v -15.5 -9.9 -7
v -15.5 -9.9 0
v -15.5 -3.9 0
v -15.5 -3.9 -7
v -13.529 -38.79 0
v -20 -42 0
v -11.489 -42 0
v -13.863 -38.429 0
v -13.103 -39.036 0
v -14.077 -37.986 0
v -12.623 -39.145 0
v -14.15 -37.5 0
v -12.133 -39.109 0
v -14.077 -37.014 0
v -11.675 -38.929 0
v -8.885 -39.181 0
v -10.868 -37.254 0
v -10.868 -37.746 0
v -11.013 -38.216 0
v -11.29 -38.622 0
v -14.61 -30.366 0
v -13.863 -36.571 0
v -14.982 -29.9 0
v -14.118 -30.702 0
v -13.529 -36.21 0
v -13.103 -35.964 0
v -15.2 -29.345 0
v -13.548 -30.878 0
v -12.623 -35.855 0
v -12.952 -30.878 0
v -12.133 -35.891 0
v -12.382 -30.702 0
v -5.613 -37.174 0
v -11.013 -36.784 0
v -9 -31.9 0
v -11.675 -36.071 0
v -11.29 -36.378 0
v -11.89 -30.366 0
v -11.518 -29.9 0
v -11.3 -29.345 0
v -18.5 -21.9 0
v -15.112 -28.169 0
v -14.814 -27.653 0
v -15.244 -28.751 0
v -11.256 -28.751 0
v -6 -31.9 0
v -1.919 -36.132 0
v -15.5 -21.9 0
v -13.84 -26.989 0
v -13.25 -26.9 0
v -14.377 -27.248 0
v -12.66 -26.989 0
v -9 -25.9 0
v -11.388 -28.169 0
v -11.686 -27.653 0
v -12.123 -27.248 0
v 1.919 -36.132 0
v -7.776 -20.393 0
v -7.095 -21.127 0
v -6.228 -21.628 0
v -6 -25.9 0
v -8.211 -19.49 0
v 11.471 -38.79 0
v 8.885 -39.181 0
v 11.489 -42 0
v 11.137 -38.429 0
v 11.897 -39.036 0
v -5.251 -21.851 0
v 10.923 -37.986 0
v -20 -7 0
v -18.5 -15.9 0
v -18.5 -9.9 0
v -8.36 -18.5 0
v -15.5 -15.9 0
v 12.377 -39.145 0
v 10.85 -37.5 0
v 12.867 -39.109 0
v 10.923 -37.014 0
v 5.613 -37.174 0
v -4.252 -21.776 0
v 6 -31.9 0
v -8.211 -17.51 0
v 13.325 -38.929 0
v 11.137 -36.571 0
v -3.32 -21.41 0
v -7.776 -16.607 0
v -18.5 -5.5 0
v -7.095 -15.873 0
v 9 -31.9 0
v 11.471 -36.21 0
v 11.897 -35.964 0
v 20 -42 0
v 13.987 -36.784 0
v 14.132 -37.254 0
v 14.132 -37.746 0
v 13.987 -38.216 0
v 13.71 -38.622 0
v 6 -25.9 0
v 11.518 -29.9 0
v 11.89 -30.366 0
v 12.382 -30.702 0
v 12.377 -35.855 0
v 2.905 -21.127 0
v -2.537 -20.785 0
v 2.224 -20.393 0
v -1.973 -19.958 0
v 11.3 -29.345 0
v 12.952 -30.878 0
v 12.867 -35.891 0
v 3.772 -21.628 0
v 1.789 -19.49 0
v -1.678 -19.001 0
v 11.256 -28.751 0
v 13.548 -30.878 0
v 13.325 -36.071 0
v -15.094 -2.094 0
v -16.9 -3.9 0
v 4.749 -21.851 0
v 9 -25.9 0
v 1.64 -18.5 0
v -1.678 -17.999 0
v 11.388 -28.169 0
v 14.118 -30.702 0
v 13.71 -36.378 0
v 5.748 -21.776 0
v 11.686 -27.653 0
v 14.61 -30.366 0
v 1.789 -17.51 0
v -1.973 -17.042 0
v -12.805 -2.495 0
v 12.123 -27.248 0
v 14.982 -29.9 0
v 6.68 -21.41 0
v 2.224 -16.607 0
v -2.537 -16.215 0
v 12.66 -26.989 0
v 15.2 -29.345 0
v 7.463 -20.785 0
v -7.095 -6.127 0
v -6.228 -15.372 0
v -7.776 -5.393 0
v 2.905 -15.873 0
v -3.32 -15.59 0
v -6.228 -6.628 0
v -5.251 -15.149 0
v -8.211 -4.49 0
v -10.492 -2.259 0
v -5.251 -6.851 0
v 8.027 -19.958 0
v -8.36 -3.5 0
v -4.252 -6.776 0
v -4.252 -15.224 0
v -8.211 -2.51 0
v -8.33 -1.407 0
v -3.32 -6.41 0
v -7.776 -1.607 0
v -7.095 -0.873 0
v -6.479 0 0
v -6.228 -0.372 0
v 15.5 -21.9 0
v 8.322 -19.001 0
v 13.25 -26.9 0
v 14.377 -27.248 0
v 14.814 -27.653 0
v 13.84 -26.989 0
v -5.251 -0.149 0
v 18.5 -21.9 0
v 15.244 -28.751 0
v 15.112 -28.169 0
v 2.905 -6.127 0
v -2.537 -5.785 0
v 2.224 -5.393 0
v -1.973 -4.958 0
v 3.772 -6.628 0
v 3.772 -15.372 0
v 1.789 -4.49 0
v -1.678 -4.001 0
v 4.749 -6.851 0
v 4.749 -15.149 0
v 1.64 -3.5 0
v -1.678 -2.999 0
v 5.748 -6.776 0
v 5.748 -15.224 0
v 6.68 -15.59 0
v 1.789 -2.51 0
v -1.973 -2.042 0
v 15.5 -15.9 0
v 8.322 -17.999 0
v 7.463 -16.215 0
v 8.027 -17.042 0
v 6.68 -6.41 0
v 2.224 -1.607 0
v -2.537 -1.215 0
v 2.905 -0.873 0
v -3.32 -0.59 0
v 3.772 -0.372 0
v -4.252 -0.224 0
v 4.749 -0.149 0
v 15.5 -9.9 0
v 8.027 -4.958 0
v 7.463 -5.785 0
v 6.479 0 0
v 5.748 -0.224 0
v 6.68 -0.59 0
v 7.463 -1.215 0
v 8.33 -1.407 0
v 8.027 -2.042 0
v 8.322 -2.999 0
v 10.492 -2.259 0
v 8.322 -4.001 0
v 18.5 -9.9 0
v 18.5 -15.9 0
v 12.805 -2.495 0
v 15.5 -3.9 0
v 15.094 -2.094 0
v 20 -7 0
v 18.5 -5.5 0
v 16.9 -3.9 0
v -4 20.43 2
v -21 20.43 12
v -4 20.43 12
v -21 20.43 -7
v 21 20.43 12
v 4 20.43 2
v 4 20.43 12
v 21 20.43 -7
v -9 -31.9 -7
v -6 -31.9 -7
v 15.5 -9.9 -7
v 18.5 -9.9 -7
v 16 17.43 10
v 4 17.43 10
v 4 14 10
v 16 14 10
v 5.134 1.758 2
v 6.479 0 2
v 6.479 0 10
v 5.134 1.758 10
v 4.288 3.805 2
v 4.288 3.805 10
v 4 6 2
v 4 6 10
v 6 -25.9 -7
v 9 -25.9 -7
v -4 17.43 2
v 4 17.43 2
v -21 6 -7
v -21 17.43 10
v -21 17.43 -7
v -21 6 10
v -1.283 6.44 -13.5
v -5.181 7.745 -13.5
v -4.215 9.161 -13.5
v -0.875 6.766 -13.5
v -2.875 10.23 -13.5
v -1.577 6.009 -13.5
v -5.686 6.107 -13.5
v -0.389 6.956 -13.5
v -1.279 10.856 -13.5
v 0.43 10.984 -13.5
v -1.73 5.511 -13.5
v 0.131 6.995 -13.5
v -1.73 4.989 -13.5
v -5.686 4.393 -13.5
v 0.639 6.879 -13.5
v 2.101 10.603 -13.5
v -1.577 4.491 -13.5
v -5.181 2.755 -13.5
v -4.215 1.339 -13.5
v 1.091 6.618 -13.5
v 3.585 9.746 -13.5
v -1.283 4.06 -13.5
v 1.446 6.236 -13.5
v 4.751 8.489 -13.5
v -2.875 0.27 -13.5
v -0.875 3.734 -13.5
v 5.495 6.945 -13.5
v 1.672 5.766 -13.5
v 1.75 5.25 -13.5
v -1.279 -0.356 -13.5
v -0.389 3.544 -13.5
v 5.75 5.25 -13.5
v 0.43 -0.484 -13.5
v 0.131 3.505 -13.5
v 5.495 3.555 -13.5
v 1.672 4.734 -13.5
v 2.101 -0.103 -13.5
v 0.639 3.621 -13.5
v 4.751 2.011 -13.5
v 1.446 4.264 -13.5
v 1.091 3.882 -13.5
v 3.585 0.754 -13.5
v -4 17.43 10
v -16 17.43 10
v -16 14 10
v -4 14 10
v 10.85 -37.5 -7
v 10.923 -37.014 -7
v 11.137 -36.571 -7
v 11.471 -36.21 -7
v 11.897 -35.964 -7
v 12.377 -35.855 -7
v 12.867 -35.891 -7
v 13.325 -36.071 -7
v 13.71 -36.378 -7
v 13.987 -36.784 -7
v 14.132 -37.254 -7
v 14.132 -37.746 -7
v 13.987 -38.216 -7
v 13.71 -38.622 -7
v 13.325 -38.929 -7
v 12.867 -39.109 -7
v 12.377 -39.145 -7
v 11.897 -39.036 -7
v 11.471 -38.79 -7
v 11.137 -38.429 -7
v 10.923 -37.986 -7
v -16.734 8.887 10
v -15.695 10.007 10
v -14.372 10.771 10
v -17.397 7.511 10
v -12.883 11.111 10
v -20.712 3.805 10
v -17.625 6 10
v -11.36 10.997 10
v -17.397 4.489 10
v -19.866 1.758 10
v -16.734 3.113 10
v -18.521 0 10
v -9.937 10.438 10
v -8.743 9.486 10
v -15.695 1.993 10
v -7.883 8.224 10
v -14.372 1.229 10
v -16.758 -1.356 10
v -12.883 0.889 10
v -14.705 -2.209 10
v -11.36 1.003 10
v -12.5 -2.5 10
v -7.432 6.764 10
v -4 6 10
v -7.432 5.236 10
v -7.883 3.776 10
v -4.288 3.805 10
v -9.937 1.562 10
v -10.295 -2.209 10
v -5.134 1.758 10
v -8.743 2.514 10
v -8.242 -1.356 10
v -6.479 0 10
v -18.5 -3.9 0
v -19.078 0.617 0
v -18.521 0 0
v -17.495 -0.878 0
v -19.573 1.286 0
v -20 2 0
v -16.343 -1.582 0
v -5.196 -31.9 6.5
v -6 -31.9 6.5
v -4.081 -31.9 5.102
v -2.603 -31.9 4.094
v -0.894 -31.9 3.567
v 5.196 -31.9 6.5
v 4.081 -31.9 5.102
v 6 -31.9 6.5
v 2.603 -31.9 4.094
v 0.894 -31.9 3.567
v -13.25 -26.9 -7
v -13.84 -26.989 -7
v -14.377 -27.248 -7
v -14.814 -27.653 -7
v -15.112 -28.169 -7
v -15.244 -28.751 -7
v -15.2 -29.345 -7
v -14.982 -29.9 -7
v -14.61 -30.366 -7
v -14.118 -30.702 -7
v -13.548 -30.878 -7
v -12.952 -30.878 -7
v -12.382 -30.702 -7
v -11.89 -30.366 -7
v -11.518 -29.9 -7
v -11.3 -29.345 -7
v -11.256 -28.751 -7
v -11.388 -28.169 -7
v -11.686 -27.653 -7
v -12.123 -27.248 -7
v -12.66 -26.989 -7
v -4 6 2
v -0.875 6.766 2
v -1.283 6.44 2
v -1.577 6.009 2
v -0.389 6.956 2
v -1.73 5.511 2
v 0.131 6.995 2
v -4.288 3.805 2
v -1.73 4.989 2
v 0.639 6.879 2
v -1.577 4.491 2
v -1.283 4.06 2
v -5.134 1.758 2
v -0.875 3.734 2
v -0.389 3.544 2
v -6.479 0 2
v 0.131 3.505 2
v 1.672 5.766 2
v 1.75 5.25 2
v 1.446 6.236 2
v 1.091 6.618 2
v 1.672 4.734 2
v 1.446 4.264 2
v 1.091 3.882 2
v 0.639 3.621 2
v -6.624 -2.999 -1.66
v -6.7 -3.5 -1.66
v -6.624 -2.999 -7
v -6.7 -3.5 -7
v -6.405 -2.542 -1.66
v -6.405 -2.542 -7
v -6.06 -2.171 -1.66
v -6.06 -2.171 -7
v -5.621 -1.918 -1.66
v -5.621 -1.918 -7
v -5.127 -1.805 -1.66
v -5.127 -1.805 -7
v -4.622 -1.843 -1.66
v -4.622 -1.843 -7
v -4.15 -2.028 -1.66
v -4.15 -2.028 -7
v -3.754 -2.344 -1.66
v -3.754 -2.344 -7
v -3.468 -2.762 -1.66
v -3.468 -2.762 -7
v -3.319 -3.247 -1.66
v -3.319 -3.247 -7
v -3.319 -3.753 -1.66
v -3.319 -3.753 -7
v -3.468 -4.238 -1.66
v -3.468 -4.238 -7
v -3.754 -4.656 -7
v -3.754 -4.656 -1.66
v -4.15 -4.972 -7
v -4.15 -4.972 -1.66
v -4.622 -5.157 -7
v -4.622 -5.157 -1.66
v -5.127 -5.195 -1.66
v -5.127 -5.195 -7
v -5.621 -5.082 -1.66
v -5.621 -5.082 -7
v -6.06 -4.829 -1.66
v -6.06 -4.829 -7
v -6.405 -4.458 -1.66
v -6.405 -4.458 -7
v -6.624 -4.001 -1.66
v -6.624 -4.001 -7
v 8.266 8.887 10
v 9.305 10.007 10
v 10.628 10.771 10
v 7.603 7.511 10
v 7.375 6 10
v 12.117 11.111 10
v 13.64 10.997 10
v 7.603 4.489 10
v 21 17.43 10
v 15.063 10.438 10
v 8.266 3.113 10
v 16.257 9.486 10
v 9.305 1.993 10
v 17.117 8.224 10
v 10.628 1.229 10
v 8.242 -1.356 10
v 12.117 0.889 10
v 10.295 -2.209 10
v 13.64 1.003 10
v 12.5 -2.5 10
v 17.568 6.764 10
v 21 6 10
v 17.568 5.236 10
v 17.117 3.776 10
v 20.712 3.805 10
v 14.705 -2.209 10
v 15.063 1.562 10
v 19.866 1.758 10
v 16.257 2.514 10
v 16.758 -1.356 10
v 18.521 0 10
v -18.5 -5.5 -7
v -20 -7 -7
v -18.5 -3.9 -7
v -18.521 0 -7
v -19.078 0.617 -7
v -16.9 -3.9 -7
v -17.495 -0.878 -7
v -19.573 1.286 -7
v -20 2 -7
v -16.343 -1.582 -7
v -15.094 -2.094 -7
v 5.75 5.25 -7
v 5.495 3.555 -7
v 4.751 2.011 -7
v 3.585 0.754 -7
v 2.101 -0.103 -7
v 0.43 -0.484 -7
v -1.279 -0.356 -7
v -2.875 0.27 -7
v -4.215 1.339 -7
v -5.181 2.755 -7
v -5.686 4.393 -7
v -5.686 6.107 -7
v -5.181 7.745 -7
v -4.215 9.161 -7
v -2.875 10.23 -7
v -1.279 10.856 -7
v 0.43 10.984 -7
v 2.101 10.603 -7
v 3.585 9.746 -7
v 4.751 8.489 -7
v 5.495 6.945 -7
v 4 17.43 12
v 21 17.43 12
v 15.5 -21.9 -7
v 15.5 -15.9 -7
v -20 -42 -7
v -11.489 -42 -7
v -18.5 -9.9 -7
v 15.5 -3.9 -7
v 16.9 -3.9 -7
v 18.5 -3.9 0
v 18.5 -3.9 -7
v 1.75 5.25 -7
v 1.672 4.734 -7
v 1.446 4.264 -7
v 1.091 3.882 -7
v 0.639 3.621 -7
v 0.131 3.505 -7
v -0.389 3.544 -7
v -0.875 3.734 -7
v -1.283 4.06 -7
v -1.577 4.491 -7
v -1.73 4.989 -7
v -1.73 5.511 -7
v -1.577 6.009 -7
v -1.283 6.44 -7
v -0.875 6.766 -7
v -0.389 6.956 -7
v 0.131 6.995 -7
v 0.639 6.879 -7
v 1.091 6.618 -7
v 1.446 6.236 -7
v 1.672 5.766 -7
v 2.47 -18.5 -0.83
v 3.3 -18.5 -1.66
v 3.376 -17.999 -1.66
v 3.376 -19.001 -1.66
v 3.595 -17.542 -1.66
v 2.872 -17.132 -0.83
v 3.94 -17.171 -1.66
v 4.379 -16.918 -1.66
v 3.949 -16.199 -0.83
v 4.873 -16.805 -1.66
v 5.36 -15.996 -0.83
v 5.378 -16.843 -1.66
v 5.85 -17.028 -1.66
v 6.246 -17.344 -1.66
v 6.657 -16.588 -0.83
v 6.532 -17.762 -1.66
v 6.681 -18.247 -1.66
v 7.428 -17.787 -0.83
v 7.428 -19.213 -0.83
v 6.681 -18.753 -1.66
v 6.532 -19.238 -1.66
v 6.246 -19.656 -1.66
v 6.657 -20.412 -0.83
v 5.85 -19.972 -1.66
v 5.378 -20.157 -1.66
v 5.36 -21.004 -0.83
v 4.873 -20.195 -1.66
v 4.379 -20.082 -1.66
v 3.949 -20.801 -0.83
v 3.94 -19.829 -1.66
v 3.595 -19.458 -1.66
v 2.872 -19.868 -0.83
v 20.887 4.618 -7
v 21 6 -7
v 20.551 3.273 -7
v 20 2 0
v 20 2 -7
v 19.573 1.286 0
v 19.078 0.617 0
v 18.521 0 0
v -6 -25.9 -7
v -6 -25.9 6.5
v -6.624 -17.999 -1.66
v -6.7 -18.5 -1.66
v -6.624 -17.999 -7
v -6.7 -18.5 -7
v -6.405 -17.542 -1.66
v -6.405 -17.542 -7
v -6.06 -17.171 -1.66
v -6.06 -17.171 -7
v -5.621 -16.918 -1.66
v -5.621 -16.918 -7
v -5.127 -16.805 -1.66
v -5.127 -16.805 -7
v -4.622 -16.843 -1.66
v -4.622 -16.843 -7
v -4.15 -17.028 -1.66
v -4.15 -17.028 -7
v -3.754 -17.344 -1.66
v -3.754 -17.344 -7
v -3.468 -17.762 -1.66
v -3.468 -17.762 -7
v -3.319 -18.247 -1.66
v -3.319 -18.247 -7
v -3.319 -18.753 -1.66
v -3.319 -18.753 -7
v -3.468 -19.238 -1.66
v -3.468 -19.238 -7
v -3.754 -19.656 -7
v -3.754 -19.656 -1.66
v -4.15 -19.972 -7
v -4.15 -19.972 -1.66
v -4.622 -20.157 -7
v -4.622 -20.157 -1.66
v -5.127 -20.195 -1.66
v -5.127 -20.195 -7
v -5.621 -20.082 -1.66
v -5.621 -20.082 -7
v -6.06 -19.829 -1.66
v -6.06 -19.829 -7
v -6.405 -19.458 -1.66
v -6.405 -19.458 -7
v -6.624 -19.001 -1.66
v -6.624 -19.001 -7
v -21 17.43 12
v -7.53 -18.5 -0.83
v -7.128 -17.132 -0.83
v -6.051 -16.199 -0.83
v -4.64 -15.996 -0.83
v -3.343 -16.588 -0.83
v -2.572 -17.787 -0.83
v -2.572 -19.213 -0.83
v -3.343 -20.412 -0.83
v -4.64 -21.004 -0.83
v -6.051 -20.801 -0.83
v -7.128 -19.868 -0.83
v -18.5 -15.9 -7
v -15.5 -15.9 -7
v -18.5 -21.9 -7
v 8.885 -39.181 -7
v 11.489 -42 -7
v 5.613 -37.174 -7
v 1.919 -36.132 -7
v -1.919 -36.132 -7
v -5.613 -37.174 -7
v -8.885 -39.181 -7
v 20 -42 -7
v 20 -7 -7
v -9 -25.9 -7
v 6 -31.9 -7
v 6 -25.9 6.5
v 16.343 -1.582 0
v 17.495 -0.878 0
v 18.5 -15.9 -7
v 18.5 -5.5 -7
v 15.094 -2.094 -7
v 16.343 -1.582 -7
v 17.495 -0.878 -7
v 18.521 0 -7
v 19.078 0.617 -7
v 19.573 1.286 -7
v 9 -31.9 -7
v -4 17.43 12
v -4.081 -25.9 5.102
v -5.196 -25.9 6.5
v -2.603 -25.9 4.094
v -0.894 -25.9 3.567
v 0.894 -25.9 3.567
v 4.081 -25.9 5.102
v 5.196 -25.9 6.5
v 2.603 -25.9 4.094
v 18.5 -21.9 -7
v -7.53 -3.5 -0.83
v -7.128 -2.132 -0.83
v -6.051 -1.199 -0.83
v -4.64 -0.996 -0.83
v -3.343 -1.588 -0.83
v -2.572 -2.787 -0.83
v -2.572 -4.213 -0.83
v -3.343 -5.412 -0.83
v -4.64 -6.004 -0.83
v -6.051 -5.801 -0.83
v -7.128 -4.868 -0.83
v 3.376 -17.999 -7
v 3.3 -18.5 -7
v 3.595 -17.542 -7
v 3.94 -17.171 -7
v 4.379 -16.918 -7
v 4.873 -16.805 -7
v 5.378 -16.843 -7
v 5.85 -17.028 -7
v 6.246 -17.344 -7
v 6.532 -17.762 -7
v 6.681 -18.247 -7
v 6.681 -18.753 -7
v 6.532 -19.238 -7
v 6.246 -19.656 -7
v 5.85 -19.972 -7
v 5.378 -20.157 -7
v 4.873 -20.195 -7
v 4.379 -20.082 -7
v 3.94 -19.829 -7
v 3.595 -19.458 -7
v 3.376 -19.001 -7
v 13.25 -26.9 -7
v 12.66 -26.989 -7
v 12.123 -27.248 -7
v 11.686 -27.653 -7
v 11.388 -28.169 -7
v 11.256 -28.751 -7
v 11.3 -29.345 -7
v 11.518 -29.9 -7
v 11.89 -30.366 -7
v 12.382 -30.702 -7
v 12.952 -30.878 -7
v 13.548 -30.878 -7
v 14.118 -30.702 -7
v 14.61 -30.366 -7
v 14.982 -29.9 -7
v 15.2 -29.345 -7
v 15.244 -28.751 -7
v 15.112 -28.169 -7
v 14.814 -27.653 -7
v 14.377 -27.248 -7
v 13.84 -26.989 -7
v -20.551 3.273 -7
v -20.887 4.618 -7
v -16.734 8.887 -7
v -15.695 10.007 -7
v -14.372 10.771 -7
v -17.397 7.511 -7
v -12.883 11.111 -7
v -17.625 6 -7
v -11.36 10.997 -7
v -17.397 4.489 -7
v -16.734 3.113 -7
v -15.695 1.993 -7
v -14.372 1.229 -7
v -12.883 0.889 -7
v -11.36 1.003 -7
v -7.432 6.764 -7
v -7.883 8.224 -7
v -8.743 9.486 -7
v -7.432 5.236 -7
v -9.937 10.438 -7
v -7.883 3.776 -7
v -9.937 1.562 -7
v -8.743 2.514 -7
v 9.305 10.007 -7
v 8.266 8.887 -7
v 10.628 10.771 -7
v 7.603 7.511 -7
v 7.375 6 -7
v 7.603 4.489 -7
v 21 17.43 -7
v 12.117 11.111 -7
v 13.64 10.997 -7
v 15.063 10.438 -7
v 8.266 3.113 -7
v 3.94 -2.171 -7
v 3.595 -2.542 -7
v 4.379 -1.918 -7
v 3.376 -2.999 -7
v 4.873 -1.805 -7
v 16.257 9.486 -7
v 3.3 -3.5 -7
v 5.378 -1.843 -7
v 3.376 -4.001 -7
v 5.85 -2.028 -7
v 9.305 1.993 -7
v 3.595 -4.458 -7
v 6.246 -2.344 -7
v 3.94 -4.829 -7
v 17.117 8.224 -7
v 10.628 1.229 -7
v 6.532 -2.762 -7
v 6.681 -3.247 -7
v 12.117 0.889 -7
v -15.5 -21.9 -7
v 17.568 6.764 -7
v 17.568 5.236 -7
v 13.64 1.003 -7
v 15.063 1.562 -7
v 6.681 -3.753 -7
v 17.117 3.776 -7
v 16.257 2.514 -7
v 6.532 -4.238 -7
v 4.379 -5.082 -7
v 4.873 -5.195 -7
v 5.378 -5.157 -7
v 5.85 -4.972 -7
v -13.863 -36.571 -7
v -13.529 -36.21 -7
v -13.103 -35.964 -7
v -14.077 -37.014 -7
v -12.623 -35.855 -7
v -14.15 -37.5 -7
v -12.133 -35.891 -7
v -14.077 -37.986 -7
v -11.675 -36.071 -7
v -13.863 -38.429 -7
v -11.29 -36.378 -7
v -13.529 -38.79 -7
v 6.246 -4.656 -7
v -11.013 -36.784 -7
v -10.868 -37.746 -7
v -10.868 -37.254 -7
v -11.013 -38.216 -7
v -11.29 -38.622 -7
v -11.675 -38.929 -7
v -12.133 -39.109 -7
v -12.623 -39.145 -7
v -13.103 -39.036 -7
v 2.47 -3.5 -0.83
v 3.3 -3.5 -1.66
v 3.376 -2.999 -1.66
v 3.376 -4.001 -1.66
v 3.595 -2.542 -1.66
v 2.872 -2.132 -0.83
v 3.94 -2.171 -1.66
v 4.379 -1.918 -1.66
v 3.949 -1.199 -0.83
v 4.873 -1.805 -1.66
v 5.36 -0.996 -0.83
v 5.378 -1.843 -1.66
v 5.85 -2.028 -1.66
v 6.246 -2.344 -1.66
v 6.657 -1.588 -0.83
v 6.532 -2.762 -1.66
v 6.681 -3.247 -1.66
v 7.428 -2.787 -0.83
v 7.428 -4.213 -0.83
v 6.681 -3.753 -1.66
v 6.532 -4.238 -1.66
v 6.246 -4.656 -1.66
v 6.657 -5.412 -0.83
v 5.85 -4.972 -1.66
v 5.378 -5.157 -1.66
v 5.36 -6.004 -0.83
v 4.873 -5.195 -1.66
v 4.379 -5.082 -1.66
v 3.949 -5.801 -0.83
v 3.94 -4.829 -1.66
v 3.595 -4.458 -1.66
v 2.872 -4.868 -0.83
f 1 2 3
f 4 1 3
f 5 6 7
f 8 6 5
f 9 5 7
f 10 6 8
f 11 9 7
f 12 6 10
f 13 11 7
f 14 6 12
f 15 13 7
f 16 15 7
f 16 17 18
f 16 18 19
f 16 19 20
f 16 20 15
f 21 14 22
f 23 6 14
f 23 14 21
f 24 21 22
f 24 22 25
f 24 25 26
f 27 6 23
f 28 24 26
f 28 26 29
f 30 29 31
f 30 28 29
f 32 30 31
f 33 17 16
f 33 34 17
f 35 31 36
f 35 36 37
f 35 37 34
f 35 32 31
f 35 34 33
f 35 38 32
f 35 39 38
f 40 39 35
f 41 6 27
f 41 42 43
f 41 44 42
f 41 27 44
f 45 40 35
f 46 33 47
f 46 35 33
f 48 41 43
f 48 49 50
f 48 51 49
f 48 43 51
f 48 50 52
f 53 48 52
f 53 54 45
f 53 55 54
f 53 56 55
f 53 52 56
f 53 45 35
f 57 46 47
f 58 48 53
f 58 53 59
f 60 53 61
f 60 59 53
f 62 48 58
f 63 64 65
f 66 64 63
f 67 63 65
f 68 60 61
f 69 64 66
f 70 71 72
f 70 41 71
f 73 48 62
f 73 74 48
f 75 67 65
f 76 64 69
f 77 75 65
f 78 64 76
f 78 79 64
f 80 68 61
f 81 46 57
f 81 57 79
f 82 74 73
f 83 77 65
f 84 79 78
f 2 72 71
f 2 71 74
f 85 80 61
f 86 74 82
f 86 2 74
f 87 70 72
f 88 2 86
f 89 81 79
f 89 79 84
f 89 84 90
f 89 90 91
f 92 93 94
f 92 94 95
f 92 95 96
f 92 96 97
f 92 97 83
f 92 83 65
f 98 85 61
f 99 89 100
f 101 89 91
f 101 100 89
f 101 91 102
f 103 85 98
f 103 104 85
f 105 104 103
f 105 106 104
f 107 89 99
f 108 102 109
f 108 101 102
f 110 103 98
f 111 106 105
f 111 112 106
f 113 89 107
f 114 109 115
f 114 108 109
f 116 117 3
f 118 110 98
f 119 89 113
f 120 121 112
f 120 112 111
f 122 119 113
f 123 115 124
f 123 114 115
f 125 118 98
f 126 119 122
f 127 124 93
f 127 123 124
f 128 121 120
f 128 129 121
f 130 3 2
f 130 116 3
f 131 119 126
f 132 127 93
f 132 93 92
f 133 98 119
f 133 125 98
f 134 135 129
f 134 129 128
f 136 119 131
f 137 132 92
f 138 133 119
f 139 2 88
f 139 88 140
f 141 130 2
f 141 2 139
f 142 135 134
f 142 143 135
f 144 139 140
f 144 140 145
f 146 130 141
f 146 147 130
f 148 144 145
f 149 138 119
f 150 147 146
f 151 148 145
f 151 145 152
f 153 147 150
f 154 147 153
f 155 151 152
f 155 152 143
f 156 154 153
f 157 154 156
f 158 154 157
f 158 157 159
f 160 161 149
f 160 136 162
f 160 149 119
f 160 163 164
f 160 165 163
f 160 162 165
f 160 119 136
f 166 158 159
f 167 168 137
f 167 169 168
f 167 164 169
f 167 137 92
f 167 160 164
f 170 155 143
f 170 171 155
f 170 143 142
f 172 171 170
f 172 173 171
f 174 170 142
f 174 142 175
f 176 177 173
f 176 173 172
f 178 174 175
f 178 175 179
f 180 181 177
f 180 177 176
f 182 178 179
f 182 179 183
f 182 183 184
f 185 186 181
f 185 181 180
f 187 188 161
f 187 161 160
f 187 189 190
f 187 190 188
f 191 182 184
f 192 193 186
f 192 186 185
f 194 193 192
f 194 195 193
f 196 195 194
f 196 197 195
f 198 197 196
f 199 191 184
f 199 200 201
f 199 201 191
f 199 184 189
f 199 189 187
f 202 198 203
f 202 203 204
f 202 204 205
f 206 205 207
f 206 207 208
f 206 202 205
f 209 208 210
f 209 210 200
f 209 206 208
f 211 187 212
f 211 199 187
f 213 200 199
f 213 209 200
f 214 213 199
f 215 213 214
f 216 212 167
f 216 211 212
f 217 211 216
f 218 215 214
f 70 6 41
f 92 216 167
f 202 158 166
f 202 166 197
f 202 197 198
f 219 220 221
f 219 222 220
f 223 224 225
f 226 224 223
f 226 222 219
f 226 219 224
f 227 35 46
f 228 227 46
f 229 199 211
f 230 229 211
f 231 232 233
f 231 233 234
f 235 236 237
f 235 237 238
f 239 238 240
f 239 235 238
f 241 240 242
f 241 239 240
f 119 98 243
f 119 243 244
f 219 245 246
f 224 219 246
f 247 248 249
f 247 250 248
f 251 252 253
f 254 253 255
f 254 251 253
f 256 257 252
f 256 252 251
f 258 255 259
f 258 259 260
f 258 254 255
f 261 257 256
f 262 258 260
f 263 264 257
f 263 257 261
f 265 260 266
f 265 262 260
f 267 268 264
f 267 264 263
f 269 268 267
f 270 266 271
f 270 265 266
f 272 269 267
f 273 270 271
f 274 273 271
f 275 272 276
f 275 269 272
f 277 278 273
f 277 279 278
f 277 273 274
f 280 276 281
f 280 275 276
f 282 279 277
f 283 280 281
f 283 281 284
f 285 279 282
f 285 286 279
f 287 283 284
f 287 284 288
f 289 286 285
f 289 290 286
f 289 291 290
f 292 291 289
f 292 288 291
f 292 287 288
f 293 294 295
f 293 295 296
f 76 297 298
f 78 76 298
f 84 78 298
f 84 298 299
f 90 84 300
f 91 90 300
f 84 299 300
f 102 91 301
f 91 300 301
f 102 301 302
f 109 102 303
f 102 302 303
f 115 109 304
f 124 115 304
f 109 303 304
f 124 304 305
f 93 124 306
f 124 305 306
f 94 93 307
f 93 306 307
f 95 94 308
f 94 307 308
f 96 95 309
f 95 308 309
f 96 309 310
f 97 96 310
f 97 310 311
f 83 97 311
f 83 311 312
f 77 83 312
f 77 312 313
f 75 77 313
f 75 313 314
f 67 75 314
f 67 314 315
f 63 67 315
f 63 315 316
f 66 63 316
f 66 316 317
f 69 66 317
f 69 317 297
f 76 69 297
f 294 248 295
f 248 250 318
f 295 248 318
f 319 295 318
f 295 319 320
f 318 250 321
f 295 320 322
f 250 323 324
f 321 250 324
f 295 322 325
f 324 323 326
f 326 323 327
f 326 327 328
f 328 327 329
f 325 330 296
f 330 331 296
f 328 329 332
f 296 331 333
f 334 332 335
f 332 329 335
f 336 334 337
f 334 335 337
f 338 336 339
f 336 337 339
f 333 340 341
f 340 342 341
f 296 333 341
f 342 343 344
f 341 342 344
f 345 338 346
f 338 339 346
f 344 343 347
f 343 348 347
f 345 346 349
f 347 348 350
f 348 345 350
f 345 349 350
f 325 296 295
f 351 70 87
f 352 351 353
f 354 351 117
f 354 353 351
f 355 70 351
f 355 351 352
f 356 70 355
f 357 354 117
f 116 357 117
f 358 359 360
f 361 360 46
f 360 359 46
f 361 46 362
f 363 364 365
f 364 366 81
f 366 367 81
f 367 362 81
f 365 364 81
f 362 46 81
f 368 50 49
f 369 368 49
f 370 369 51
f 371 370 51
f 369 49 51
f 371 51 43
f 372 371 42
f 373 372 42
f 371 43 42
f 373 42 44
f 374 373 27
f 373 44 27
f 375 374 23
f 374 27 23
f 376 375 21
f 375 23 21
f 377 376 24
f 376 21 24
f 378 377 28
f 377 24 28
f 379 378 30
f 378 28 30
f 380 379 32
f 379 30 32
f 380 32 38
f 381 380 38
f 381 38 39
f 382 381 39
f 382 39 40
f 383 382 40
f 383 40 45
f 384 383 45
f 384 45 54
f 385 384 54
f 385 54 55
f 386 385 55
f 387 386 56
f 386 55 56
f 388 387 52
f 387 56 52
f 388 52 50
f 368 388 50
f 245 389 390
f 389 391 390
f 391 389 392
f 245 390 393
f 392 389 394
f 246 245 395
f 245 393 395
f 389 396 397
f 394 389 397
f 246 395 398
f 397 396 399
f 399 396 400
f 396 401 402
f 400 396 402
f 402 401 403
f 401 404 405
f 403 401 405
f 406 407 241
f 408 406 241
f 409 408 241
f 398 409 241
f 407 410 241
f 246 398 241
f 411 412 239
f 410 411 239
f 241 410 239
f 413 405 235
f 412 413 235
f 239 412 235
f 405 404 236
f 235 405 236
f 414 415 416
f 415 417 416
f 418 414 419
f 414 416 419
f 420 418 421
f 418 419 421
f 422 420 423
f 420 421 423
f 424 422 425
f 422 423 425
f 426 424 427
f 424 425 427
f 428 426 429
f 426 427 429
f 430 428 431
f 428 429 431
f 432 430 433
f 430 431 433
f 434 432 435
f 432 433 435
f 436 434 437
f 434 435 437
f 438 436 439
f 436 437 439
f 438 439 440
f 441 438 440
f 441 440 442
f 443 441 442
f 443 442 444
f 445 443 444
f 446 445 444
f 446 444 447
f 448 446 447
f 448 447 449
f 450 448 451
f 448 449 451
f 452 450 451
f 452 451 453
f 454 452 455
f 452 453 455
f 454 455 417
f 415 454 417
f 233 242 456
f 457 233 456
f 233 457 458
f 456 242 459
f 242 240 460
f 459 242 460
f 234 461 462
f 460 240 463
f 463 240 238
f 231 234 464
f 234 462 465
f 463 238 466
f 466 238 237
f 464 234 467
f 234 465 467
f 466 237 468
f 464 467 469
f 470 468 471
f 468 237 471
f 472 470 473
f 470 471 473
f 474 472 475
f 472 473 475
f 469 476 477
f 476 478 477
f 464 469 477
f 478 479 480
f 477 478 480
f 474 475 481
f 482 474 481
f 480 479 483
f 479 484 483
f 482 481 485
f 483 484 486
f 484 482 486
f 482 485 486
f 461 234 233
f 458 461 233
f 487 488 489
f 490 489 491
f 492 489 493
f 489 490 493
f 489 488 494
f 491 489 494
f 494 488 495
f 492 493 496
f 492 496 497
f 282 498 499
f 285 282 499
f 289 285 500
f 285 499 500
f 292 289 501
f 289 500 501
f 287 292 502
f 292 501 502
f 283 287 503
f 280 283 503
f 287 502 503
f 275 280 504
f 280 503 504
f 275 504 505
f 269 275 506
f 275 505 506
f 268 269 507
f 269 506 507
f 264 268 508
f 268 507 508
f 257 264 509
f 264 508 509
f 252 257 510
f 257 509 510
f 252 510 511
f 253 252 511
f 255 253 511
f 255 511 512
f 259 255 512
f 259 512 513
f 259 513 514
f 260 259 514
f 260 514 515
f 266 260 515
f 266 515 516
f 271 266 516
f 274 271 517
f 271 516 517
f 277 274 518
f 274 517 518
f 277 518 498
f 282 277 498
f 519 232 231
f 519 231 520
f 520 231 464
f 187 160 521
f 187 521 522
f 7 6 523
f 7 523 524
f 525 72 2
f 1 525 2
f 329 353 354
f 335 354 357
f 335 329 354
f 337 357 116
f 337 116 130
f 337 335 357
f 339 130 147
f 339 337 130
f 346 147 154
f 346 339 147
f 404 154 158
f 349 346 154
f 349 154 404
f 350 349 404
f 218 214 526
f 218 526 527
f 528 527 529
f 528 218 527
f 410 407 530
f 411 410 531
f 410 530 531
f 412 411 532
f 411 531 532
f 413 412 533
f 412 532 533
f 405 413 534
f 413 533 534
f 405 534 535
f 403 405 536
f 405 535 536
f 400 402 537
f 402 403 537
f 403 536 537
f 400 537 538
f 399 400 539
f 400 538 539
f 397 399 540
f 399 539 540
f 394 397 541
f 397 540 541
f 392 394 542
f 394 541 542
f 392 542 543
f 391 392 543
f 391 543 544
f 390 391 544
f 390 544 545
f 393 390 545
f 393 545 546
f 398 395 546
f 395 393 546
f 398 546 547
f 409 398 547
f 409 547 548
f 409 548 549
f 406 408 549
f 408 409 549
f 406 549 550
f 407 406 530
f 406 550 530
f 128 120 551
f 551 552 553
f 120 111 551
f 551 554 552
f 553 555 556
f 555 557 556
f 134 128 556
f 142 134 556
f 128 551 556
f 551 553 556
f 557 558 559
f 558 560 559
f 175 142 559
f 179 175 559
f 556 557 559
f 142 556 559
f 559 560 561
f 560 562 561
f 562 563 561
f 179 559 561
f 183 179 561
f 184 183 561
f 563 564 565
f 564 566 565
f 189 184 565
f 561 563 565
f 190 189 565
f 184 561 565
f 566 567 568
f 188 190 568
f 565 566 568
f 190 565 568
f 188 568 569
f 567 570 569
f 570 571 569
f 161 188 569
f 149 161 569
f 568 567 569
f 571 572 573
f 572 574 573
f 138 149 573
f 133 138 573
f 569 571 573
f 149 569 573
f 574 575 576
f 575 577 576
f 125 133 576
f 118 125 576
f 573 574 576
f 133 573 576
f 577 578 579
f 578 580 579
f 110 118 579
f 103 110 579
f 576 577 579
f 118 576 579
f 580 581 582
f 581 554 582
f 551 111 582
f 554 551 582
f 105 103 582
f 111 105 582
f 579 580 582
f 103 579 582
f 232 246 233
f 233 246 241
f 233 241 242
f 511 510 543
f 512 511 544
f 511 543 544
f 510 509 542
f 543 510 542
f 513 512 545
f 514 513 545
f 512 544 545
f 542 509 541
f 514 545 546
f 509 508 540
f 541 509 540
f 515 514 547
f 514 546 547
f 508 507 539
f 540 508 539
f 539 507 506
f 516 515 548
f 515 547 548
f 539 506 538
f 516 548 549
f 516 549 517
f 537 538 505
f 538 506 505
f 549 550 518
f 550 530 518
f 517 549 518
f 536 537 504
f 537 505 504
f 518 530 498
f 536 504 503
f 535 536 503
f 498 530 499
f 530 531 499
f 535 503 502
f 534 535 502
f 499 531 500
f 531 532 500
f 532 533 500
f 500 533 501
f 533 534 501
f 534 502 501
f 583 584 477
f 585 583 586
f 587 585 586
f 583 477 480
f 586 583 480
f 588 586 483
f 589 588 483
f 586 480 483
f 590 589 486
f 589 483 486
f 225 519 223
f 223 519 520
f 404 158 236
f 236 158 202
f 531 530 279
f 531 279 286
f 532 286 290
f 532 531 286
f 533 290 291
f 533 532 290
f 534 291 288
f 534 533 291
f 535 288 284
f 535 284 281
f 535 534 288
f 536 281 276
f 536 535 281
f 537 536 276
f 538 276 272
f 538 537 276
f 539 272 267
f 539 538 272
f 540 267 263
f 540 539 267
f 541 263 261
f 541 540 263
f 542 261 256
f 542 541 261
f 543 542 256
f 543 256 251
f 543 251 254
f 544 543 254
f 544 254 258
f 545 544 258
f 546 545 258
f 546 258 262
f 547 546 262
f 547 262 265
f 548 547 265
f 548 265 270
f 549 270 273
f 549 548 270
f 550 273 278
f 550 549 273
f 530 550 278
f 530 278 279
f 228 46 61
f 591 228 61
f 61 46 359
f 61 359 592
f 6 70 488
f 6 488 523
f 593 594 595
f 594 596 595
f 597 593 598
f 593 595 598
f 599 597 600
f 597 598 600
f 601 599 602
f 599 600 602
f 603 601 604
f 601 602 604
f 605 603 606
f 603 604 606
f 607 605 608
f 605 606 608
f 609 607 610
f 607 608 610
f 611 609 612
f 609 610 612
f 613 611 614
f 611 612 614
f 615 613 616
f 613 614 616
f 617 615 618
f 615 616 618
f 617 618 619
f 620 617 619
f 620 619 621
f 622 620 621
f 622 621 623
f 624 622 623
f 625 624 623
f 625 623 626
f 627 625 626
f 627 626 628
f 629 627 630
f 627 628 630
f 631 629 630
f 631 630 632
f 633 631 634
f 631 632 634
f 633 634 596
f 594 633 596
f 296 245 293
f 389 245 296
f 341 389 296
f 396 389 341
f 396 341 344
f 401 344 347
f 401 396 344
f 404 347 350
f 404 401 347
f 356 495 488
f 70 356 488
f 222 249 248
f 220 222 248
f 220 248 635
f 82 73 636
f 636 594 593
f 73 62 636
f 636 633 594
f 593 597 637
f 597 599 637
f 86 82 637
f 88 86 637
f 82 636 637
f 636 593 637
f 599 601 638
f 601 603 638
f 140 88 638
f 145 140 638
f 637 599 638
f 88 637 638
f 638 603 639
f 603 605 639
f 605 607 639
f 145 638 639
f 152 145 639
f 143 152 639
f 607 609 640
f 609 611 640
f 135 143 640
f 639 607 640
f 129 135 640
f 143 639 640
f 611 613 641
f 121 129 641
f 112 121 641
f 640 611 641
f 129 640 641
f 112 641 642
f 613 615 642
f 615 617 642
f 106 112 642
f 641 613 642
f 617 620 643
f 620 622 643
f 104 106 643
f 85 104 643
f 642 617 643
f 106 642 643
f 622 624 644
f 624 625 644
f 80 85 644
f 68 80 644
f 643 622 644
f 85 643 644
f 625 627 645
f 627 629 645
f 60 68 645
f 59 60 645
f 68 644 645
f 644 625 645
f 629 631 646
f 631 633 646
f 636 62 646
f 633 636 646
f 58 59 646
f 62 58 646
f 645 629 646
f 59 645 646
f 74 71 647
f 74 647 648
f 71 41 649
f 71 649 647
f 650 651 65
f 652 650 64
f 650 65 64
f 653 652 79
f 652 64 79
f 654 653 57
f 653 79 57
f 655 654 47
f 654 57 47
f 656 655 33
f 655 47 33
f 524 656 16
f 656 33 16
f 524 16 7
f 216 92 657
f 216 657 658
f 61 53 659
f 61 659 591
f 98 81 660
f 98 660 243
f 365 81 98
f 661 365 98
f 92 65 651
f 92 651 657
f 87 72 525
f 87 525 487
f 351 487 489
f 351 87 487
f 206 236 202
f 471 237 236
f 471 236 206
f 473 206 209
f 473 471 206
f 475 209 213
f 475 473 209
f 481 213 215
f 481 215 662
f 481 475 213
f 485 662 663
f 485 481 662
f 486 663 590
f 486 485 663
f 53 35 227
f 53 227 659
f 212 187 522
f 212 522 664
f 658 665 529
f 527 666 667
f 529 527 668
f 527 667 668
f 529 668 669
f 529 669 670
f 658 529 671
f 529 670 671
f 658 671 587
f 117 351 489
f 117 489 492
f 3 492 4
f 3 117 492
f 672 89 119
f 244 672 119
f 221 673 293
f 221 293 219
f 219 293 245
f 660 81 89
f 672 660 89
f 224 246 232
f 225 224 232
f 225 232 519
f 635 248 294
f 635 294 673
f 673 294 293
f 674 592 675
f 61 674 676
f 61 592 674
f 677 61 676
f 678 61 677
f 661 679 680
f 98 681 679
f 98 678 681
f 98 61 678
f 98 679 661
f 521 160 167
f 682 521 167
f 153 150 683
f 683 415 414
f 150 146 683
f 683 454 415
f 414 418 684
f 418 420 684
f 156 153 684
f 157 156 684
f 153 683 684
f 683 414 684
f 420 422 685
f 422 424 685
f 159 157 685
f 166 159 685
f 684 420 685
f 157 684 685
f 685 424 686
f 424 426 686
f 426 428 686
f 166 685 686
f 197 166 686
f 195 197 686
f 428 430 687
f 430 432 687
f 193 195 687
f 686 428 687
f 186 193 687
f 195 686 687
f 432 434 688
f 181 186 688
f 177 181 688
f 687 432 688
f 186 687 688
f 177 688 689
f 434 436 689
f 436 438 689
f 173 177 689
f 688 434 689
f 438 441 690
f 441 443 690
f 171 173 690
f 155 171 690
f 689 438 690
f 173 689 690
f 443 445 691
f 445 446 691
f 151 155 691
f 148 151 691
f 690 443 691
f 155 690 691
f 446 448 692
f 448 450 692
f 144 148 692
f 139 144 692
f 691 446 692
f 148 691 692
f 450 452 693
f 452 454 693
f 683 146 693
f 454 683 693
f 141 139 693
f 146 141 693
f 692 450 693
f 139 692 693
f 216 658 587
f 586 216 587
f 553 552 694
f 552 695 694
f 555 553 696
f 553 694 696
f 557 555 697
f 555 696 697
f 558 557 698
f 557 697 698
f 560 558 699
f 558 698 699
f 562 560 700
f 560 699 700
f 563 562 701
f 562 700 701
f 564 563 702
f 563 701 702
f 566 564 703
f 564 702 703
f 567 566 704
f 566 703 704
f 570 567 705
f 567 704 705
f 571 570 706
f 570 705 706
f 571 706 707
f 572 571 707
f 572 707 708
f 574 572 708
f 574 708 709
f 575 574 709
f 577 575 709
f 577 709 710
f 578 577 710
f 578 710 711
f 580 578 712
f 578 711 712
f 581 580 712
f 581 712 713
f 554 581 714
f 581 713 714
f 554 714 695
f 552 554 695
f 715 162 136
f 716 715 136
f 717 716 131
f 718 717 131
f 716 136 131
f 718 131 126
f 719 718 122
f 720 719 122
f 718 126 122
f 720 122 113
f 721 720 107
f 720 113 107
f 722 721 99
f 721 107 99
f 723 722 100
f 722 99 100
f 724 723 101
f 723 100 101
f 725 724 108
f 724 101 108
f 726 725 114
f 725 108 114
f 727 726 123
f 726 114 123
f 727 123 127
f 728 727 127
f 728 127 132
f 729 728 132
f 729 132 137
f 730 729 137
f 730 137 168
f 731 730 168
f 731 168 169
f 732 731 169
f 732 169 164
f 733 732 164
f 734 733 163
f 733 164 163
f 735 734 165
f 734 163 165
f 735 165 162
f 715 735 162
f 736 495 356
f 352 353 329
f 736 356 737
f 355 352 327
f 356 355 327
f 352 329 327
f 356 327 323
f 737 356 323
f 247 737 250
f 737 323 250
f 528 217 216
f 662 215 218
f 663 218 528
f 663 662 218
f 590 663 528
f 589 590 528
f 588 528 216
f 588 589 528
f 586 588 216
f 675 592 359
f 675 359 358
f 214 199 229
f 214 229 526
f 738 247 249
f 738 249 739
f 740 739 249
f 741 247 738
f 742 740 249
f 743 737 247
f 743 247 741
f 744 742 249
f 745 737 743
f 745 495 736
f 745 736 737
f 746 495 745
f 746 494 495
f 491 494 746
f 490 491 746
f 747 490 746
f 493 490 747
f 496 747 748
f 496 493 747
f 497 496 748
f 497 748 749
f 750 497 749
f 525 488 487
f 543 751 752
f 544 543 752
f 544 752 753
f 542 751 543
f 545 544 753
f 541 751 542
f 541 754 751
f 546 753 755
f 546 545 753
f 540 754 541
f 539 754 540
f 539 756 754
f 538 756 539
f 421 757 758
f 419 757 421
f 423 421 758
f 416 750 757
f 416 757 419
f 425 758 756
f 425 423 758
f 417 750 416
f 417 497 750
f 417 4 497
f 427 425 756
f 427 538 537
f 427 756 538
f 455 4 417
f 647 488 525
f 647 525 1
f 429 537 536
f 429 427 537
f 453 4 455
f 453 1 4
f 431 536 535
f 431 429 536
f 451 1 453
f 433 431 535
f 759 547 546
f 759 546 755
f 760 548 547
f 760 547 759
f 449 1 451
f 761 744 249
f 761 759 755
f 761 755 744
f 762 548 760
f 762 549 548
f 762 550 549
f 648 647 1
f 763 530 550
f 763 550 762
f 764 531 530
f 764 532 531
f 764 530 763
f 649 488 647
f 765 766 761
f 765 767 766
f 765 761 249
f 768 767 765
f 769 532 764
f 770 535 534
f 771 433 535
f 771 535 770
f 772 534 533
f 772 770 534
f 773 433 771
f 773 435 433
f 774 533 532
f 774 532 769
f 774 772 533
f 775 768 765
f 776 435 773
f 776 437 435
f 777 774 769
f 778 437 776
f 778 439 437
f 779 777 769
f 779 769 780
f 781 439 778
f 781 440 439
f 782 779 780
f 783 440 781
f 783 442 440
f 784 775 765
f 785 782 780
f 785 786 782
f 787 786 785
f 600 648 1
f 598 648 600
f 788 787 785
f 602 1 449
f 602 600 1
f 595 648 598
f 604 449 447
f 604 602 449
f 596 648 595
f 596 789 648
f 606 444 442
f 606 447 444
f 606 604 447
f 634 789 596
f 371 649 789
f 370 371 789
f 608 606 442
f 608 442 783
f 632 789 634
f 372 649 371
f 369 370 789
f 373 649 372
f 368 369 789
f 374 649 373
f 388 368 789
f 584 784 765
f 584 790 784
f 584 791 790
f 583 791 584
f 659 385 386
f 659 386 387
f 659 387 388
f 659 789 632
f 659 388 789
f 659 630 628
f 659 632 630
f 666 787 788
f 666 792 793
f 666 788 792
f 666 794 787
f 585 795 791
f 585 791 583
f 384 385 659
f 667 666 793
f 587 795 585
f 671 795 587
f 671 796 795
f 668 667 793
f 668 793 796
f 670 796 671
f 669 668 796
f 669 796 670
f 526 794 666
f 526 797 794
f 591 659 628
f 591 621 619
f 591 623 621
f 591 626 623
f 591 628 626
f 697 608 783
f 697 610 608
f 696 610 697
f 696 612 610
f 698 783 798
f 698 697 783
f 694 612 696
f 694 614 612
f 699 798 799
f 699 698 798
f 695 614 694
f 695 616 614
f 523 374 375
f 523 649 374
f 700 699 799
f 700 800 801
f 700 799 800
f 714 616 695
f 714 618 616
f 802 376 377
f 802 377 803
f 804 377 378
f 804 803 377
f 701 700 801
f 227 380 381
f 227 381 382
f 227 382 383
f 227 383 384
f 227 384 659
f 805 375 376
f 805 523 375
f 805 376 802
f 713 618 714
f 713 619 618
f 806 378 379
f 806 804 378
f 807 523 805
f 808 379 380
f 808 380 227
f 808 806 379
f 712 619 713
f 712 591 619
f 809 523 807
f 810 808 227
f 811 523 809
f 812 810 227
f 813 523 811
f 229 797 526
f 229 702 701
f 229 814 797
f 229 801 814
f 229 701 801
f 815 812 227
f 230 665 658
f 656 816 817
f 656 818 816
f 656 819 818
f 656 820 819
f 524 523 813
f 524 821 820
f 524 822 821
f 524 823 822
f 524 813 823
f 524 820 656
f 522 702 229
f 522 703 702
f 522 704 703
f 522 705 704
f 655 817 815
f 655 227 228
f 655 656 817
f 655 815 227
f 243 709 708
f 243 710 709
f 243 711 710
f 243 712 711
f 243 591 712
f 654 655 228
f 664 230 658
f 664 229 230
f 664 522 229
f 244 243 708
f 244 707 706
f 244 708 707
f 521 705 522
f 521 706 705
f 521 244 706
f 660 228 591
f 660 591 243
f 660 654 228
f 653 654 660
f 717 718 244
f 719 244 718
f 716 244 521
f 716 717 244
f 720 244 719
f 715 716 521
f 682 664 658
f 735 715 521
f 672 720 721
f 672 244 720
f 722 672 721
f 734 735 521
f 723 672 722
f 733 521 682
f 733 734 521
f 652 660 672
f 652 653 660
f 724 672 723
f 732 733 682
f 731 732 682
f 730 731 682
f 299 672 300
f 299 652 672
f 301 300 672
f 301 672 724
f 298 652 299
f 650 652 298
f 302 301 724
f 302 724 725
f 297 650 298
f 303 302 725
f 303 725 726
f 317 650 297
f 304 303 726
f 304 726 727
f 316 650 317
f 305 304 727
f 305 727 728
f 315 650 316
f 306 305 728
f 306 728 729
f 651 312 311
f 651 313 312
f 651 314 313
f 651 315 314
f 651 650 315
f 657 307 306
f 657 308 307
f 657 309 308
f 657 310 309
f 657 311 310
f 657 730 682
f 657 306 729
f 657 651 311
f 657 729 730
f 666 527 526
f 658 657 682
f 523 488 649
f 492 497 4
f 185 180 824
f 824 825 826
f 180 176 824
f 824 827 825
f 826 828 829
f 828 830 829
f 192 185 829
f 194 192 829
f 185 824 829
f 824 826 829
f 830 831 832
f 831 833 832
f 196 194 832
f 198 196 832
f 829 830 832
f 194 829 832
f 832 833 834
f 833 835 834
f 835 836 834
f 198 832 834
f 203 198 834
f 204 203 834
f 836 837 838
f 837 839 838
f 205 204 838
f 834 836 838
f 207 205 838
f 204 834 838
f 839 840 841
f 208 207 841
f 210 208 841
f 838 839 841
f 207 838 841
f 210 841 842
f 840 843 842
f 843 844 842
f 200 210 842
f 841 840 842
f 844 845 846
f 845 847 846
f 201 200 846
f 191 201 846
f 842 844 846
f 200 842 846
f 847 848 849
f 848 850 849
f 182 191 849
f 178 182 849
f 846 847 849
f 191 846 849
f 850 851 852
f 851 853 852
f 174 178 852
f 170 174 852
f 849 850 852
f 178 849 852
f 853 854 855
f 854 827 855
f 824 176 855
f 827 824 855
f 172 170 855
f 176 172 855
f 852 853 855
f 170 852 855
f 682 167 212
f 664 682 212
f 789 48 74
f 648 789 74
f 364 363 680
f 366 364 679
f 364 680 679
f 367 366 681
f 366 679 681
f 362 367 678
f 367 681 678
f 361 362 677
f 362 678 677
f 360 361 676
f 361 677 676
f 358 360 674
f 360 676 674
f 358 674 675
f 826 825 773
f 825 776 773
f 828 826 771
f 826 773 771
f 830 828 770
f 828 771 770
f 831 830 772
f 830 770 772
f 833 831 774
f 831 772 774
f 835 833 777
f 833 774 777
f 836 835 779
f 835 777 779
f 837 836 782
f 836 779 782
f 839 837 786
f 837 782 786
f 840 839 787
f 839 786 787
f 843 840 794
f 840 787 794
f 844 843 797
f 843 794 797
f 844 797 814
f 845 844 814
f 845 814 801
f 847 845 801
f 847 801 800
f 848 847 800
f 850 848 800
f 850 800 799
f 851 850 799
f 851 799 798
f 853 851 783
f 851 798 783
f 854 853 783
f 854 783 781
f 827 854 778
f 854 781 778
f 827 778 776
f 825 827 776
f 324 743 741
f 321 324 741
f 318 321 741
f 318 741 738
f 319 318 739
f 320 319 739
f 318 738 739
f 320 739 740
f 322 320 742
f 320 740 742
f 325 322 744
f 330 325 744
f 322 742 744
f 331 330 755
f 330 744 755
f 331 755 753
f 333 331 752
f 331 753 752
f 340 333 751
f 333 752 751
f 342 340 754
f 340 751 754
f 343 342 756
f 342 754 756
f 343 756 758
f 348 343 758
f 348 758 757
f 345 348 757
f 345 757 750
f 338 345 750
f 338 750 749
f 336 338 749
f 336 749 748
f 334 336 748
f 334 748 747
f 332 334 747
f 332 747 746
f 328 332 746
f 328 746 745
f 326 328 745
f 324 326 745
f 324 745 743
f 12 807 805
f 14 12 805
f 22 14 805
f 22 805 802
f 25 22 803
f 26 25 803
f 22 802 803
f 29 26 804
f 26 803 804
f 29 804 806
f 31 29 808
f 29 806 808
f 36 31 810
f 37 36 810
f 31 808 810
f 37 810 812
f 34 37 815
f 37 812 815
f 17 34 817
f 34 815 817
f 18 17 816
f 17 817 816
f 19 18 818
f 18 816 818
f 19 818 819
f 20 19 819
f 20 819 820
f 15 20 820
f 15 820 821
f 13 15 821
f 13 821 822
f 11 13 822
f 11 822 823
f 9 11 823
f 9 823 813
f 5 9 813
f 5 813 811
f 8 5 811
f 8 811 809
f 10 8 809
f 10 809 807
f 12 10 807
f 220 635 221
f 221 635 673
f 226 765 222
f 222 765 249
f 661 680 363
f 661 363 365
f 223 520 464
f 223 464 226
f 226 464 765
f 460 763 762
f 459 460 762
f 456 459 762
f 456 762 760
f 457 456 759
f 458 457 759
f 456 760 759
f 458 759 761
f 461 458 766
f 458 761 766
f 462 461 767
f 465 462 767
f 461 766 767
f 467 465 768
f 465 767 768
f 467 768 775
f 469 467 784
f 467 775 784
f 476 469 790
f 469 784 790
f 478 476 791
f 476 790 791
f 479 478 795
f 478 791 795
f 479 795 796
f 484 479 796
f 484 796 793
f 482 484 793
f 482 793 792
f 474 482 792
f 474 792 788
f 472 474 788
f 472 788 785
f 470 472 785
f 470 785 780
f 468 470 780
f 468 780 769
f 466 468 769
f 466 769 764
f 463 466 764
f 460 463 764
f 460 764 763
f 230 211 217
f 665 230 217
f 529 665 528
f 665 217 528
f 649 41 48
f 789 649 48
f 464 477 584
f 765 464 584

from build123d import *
from build123d.topology import SkipClean

# Parameters (mm, degrees)
SKETCH1_W                         = 30
SKETCH1_H                         = 42
BOSS_EXTRUDE1_DEPTH               = 7
CSK_FOR_M3_SFHCS1_D               = 3.4
CSK_FOR_M3_SFHCS1_CSINK_D         = 6.72
CSK_FOR_M3_SFHCS1_CSINK_ANGLE     = 90
SKETCH4_R                         = 14
CUT_EXTRUDE1_DEPTH                = 10
M4X0_7_TAPPED_HOLE1_D             = 3.3
SKETCH8_W                         = 12
SKETCH8_H                         = 6
BOSS_EXTRUDE2_DEPTH               = 6.5
SKETCH9_R                         = 6
CUT_EXTRUDE2_DEPTH                = 10
SKETCH13_W                        = 3
SKETCH13_H                        = 6
CUT_EXTRUDE4_DEPTH                = 10
BOSS_EXTRUDE5_DEPTH               = 10
BOSS_EXTRUDE5_DEPTH_BACK          = 7
SKETCH14_W                        = 48
SKETCH14_H                        = 17
SKETCH15_R                        = 5.125
CUT_EXTRUDE5_DEPTH                = 52.273774973
BOSS_EXTRUDE6_REACH               = 53.274
SKETCH16_R                        = 8.5
SKETCH16_R_2                      = 5.125
SKETCH18_R                        = 5.75
SKETCH18_R_2                      = 1.75
BOSS_EXTRUDE7_DEPTH               = 6.5
SKETCH19_R                        = 1.75
CUT_EXTRUDE6_DEPTH                = 17
SKETCH20_W                        = 32
SKETCH20_H                        = 3
BOSS_EXTRUDE8_DEPTH               = 3
CUT_EXTRUDE7_DEPTH                = 8
CUT_EXTRUDE7_DEPTH_BACK           = 8
SKETCH22_R                        = 1.75
SKETCH22_W                        = 8
SKETCH22_H                        = 3
SKETCH24_W                        = 2
SKETCH24_H                        = 7.001
F_4_0_4_DIAMETER_HOLE1_AT_2_COUNT = 2
F_4_0_4_DIAMETER_HOLE1_AT_2_PITCH = 26.5
CUT_EXTRUDE8_DEPTH                = 17
MOVE_FACE2_BY                     = 0.43
SKETCH26_W                        = 32
SKETCH26_H                        = 3.43
CUT_EXTRUDE9_DEPTH                = 3
BOSS_EXTRUDE9_DEPTH               = 3
DELETEFACE1_START                 = -7
DELETEFACE1_DEPTH                 = 7
SKETCH28_W                        = 3
SKETCH28_H                        = 6
CUT_EXTRUDE10_DEPTH               = 49.859492425


# Read off the part's stored shape, not the designer's step: DeleteFace1
with BuildPart() as part:
    # Sketch1 → Boss-Extrude1 (new body)
    with BuildSketch(Plane.XY):
        with Locations((0, -21)):
            Rectangle(SKETCH1_W, SKETCH1_H)
        Polygon((-15, -42), (-15, -2), (-20, -7), (-20, -42), align=None)
        Polygon((15, -2), (15, -42), (20, -42), (20, -7), align=None)
    extrude(amount=-BOSS_EXTRUDE1_DEPTH)

    # CSK for M3 SFHCS1 (through all)
    with Locations(Plane.XY):
        with Locations((-5, -3.5), (5, -3.5), (-5, -18.5), (5, -18.5)):
            CounterSinkHole(CSK_FOR_M3_SFHCS1_D / 2, CSK_FOR_M3_SFHCS1_CSINK_D / 2, counter_sink_angle=CSK_FOR_M3_SFHCS1_CSINK_ANGLE)

    # Sketch4 → Cut-Extrude1 (cut)
    with BuildSketch(Plane.XY):
        with Locations((0, -50)):
            Circle(SKETCH4_R)
    extrude(amount=-CUT_EXTRUDE1_DEPTH, mode=Mode.SUBTRACT)

    # M4x0.7 Tapped Hole1 (through all)
    with Locations(Plane.XY):
        with Locations((-12.5, -37.5), (12.5, -37.5)):
            Hole(M4X0_7_TAPPED_HOLE1_D / 2)

    # Sketch8 → Boss-Extrude2 (add)
    with BuildSketch(Plane.XY):
        with Locations((0, -28.9)):
            Rectangle(SKETCH8_W, SKETCH8_H)
    extrude(amount=BOSS_EXTRUDE2_DEPTH)

    # Sketch9 → Cut-Extrude2 (cut)
    with BuildSketch(Plane(origin=(0, -25.9, 0), x_dir=(1, 0, 0), z_dir=(0, 1, 0))):
        with Locations((0, -9.5)):
            Circle(SKETCH9_R)
    extrude(amount=-CUT_EXTRUDE2_DEPTH, mode=Mode.SUBTRACT)

    # Sketch13 → Cut-Extrude4 (cut)
    with BuildSketch(Plane.XY):
        with Locations((-7.5, -28.9)):
            Rectangle(SKETCH13_W, SKETCH13_H)
        with Locations((7.5, -28.9)):
            Rectangle(SKETCH13_W, SKETCH13_H)
    extrude(amount=-CUT_EXTRUDE4_DEPTH, mode=Mode.SUBTRACT)

    # Sketch14 → Boss-Extrude5 (add, two sides: drawn at the far end of the back side and taken through both)
    with BuildSketch(Plane.XY.offset(-BOSS_EXTRUDE5_DEPTH_BACK)):
        with Locations((0, 8.5)):
            Rectangle(SKETCH14_W, SKETCH14_H)
    extrude(amount=BOSS_EXTRUDE5_DEPTH + BOSS_EXTRUDE5_DEPTH_BACK)

    # Sketch15 → Cut-Extrude5 (cut, through all)
    with BuildSketch(Plane(origin=(0, 0, -7), x_dir=(-1, 0, 0), z_dir=(0, 0, -1))):
        with Locations((12.5, 6)):
            Circle(SKETCH15_R)
        with Locations((-12.5, 6)):
            Circle(SKETCH15_R)
    extrude(amount=-CUT_EXTRUDE5_DEPTH, mode=Mode.SUBTRACT)

    # Boss-Extrude6: up to this face of the body (flat: up to its plane)
    boss_extrude6_end = Plane(part.part.faces().sort_by_distance((0, -11.103380249, -7))[0])
    # Sketch16 → Boss-Extrude6 (add, up to the picked face)
    with BuildSketch(Plane.XY.offset(10), mode=Mode.PRIVATE) as boss_extrude6_sk1:
        with Locations((-12.5, 6)):
            Circle(SKETCH16_R)
        with Locations(Location((-12.5, 6, 0), (0, 0, 180))):
            Circle(SKETCH16_R_2, mode=Mode.SUBTRACT)
    boss_extrude6_tool1 = split(extrude(boss_extrude6_sk1.sketch, amount=-BOSS_EXTRUDE6_REACH, mode=Mode.PRIVATE), bisect_by=boss_extrude6_end, keep=Keep.BOTH, mode=Mode.PRIVATE)
    # Sketch16 → Boss-Extrude6 (add, up to the picked face)
    with BuildSketch(Plane.XY.offset(10), mode=Mode.PRIVATE) as boss_extrude6_sk2:
        with Locations((12.5, 6)):
            Circle(SKETCH16_R)
        with Locations(Location((12.5, 6, 0), (0, 0, 180))):
            Circle(SKETCH16_R_2, mode=Mode.SUBTRACT)
    boss_extrude6_tool2 = split(extrude(boss_extrude6_sk2.sketch, amount=-BOSS_EXTRUDE6_REACH, mode=Mode.PRIVATE), bisect_by=boss_extrude6_end, keep=Keep.BOTH, mode=Mode.PRIVATE)
    add(boss_extrude6_tool1.solids().sort_by(Axis((-20.759584, 6, 10), (0, 0, -1)))[0])
    add(boss_extrude6_tool2.solids().sort_by(Axis((4.240416, 6, 10), (0, 0, -1)))[0])

    # Sketch19 → Cut-Extrude6 (cut)
    with BuildSketch(Plane(origin=(0, 0, -7), x_dir=(-1, 0, 0), z_dir=(0, 0, -1))):
        with Locations(Location((0, 5.25, 0), (0, 0, 180))):
            Circle(SKETCH19_R)
    extrude(amount=-CUT_EXTRUDE6_DEPTH, mode=Mode.SUBTRACT)

    # Sketch20 → Boss-Extrude8 (add)
    with BuildSketch(Plane.XY.offset(10)):
        with Locations((0, 15.5)):
            Rectangle(SKETCH20_W, SKETCH20_H)
    extrude(amount=BOSS_EXTRUDE8_DEPTH)

    # Sketch22 → Cut-Extrude7 (cut, two sides: drawn at the far end of the back side and taken through both)
    # profile 1 of 4: a face of its own
    with SkipClean():  # the faces are left unmerged after this step: merging them gives an invalid solid
        with BuildSketch(Plane.XY.offset(10).offset(-CUT_EXTRUDE7_DEPTH_BACK)):
            Polygon((-4, 6), (-4, 0), (4, 0), (4, 6), (4, 14), (-4, 14), align=None)
            with Locations((0, 5.25)):
                Circle(SKETCH22_R, mode=Mode.SUBTRACT)
        # profile 2 of 4: a face of its own
        with BuildSketch(Plane.XY.offset(10).offset(-CUT_EXTRUDE7_DEPTH_BACK)):
            with BuildLine():
                Line((-6.479202711, 0), (-4, 0))
                Line((-4, 0), (-4, 6))
                ThreePointArc((-4, 6), (-4.644213058, 2.753985287), (-6.479202711, 0))
            make_face()
        # profile 3 of 4: a face of its own
        with BuildSketch(Plane.XY.offset(10).offset(-CUT_EXTRUDE7_DEPTH_BACK)):
            with BuildLine():
                Line((4, 6), (4, 0))
                Line((4, 0), (6.479202711, 0))
                ThreePointArc((6.479202711, 0), (4.644213058, 2.753985287), (4, 6))
            make_face()
        # profile 4 of 4: a face of its own
        with BuildSketch(Plane.XY.offset(10).offset(-CUT_EXTRUDE7_DEPTH_BACK)):
            with Locations((0, 15.5)):
                Rectangle(SKETCH22_W, SKETCH22_H)
        extrude(amount=CUT_EXTRUDE7_DEPTH + CUT_EXTRUDE7_DEPTH_BACK, mode=Mode.SUBTRACT)

    # Sketch24 → Ø4.0 (4) Diameter Hole1 (revolve, cut)
    with SkipClean():  # the faces are left unmerged after this step: merging them gives an invalid solid
        with BuildSketch(Plane(origin=(13.25, -28.9, -7), x_dir=(0, 1, 0), z_dir=(1, 0, 0))):
            with Locations((1, 3.5005)):
                Rectangle(SKETCH24_W, SKETCH24_H)
        f_4_0_4_diameter_hole1 = revolve(axis=Axis((13.25, -28.9, -13.35), (0, 0, 1)), mode=Mode.SUBTRACT)

    # Ø4.0 (4) Diameter Hole1 at 2: Ø4.0 (4) Diameter Hole1 ×2
    with SkipClean():  # the faces are left unmerged after this step: merging them gives an invalid solid
        with Locations(*[(-i * F_4_0_4_DIAMETER_HOLE1_AT_2_PITCH, 0, 0) for i in range(1, F_4_0_4_DIAMETER_HOLE1_AT_2_COUNT)]):
            add(f_4_0_4_diameter_hole1, mode=Mode.SUBTRACT)

    # Sketch25 → Cut-Extrude8 (cut)
    with SkipClean():  # the faces are left unmerged after this step: merging them gives an invalid solid
        with BuildSketch(Plane.XY.offset(10)):
            with BuildLine():
                ThreePointArc((-18.520797289, 0), (-20.355786942, 2.753985287), (-21, 6))
                Line((-21, 6), (-21, 17))
                Line((-21, 17), (-24, 17))
                Line((-24, 17), (-24, 0))
                Line((-24, 0), (-18.520797289, 0))
            make_face()
            with BuildLine():
                ThreePointArc((21, 6), (20.355786942, 2.753985287), (18.520797289, 0))
                Line((18.520797289, 0), (24, 0))
                Line((24, 0), (24, 17))
                Line((24, 17), (21, 17))
                Line((21, 17), (21, 6))
            make_face()
        extrude(amount=-CUT_EXTRUDE8_DEPTH, mode=Mode.SUBTRACT)

    # Move Face2: a face moved outward by 0.43
    extrude(part.faces().sort_by_distance((0, 17, -2))[0], amount=MOVE_FACE2_BY, dir=(0, 1, 0))

    # Sketch26 → Cut-Extrude9 (cut)
    with SkipClean():  # the faces are left unmerged after this step: merging them gives an invalid solid
        with BuildSketch(Plane.XY.offset(13)):
            with Locations((0, 15.715)):
                Rectangle(SKETCH26_W, SKETCH26_H)
        extrude(amount=-CUT_EXTRUDE9_DEPTH, mode=Mode.SUBTRACT)

    # Sketch27 → Boss-Extrude9 (add)
    with SkipClean():  # the faces are left unmerged after this step: merging them gives an invalid solid
        with BuildSketch(Plane(origin=(0, 17.43, 0), x_dir=(1, 0, 0), z_dir=(0, 1, 0))):
            Polygon((-21, -10), (-21, -12), (-4, -12), (-4, -10), (-4, -2), (4, -2), (4, -10), (4, -12), (21, -12), (21, -10), (21, 7), (-21, 7), align=None)
        extrude(amount=BOSS_EXTRUDE9_DEPTH)

    # DeleteFace1 outline → DeleteFace1 (add)
    with SkipClean():  # the faces are left unmerged after this step: merging them gives an invalid solid
        with BuildSketch(Plane.XY.offset(DELETEFACE1_START)):
            with BuildLine():
                ThreePointArc((-15.094389582, -2.094389582), (-17.946575233, -0.525704424), (-20, 2))
                Line((-20, 2), (-20, -7))
                Line((-20, -7), (-15.094389582, -2.094389582))
            make_face()
            with BuildLine():
                Line((20, -7), (20, 2))
                ThreePointArc((20, 2), (17.946575233, -0.525704424), (15.094389582, -2.094389582))
                Line((15.094389582, -2.094389582), (20, -7))
            make_face()
        extrude(amount=DELETEFACE1_DEPTH)

    # Sketch28 → Cut-Extrude10 (cut, through all)
    with SkipClean():  # the faces are left unmerged after this step: merging them gives an invalid solid
        with BuildSketch(Plane.XY):
            with Locations((17, -18.9)):
                Rectangle(SKETCH28_W, SKETCH28_H)
            with Locations((17, -6.9)):
                Rectangle(SKETCH28_W, SKETCH28_H)
            with Locations((-17, -6.9)):
                Rectangle(SKETCH28_W, SKETCH28_H)
            with Locations((-17, -18.9)):
                Rectangle(SKETCH28_W, SKETCH28_H)
        extrude(amount=-CUT_EXTRUDE10_DEPTH, mode=Mode.SUBTRACT)


with BuildPart() as body_2:
    # Sketch18 → Boss-Extrude7 (new body)
    with BuildSketch(Plane(origin=(0, 0, -7), x_dir=(-1, 0, 0), z_dir=(0, 0, -1))):
        with Locations(Location((0, 5.25, 0), (0, 0, 180))):
            Circle(SKETCH18_R)
        with Locations(Location((0, 5.25, 0), (0, 0, 180))):
            Circle(SKETCH18_R_2, mode=Mode.SUBTRACT)
    extrude(amount=BOSS_EXTRUDE7_DEPTH)


solid = Compound([part.part, body_2.part])
